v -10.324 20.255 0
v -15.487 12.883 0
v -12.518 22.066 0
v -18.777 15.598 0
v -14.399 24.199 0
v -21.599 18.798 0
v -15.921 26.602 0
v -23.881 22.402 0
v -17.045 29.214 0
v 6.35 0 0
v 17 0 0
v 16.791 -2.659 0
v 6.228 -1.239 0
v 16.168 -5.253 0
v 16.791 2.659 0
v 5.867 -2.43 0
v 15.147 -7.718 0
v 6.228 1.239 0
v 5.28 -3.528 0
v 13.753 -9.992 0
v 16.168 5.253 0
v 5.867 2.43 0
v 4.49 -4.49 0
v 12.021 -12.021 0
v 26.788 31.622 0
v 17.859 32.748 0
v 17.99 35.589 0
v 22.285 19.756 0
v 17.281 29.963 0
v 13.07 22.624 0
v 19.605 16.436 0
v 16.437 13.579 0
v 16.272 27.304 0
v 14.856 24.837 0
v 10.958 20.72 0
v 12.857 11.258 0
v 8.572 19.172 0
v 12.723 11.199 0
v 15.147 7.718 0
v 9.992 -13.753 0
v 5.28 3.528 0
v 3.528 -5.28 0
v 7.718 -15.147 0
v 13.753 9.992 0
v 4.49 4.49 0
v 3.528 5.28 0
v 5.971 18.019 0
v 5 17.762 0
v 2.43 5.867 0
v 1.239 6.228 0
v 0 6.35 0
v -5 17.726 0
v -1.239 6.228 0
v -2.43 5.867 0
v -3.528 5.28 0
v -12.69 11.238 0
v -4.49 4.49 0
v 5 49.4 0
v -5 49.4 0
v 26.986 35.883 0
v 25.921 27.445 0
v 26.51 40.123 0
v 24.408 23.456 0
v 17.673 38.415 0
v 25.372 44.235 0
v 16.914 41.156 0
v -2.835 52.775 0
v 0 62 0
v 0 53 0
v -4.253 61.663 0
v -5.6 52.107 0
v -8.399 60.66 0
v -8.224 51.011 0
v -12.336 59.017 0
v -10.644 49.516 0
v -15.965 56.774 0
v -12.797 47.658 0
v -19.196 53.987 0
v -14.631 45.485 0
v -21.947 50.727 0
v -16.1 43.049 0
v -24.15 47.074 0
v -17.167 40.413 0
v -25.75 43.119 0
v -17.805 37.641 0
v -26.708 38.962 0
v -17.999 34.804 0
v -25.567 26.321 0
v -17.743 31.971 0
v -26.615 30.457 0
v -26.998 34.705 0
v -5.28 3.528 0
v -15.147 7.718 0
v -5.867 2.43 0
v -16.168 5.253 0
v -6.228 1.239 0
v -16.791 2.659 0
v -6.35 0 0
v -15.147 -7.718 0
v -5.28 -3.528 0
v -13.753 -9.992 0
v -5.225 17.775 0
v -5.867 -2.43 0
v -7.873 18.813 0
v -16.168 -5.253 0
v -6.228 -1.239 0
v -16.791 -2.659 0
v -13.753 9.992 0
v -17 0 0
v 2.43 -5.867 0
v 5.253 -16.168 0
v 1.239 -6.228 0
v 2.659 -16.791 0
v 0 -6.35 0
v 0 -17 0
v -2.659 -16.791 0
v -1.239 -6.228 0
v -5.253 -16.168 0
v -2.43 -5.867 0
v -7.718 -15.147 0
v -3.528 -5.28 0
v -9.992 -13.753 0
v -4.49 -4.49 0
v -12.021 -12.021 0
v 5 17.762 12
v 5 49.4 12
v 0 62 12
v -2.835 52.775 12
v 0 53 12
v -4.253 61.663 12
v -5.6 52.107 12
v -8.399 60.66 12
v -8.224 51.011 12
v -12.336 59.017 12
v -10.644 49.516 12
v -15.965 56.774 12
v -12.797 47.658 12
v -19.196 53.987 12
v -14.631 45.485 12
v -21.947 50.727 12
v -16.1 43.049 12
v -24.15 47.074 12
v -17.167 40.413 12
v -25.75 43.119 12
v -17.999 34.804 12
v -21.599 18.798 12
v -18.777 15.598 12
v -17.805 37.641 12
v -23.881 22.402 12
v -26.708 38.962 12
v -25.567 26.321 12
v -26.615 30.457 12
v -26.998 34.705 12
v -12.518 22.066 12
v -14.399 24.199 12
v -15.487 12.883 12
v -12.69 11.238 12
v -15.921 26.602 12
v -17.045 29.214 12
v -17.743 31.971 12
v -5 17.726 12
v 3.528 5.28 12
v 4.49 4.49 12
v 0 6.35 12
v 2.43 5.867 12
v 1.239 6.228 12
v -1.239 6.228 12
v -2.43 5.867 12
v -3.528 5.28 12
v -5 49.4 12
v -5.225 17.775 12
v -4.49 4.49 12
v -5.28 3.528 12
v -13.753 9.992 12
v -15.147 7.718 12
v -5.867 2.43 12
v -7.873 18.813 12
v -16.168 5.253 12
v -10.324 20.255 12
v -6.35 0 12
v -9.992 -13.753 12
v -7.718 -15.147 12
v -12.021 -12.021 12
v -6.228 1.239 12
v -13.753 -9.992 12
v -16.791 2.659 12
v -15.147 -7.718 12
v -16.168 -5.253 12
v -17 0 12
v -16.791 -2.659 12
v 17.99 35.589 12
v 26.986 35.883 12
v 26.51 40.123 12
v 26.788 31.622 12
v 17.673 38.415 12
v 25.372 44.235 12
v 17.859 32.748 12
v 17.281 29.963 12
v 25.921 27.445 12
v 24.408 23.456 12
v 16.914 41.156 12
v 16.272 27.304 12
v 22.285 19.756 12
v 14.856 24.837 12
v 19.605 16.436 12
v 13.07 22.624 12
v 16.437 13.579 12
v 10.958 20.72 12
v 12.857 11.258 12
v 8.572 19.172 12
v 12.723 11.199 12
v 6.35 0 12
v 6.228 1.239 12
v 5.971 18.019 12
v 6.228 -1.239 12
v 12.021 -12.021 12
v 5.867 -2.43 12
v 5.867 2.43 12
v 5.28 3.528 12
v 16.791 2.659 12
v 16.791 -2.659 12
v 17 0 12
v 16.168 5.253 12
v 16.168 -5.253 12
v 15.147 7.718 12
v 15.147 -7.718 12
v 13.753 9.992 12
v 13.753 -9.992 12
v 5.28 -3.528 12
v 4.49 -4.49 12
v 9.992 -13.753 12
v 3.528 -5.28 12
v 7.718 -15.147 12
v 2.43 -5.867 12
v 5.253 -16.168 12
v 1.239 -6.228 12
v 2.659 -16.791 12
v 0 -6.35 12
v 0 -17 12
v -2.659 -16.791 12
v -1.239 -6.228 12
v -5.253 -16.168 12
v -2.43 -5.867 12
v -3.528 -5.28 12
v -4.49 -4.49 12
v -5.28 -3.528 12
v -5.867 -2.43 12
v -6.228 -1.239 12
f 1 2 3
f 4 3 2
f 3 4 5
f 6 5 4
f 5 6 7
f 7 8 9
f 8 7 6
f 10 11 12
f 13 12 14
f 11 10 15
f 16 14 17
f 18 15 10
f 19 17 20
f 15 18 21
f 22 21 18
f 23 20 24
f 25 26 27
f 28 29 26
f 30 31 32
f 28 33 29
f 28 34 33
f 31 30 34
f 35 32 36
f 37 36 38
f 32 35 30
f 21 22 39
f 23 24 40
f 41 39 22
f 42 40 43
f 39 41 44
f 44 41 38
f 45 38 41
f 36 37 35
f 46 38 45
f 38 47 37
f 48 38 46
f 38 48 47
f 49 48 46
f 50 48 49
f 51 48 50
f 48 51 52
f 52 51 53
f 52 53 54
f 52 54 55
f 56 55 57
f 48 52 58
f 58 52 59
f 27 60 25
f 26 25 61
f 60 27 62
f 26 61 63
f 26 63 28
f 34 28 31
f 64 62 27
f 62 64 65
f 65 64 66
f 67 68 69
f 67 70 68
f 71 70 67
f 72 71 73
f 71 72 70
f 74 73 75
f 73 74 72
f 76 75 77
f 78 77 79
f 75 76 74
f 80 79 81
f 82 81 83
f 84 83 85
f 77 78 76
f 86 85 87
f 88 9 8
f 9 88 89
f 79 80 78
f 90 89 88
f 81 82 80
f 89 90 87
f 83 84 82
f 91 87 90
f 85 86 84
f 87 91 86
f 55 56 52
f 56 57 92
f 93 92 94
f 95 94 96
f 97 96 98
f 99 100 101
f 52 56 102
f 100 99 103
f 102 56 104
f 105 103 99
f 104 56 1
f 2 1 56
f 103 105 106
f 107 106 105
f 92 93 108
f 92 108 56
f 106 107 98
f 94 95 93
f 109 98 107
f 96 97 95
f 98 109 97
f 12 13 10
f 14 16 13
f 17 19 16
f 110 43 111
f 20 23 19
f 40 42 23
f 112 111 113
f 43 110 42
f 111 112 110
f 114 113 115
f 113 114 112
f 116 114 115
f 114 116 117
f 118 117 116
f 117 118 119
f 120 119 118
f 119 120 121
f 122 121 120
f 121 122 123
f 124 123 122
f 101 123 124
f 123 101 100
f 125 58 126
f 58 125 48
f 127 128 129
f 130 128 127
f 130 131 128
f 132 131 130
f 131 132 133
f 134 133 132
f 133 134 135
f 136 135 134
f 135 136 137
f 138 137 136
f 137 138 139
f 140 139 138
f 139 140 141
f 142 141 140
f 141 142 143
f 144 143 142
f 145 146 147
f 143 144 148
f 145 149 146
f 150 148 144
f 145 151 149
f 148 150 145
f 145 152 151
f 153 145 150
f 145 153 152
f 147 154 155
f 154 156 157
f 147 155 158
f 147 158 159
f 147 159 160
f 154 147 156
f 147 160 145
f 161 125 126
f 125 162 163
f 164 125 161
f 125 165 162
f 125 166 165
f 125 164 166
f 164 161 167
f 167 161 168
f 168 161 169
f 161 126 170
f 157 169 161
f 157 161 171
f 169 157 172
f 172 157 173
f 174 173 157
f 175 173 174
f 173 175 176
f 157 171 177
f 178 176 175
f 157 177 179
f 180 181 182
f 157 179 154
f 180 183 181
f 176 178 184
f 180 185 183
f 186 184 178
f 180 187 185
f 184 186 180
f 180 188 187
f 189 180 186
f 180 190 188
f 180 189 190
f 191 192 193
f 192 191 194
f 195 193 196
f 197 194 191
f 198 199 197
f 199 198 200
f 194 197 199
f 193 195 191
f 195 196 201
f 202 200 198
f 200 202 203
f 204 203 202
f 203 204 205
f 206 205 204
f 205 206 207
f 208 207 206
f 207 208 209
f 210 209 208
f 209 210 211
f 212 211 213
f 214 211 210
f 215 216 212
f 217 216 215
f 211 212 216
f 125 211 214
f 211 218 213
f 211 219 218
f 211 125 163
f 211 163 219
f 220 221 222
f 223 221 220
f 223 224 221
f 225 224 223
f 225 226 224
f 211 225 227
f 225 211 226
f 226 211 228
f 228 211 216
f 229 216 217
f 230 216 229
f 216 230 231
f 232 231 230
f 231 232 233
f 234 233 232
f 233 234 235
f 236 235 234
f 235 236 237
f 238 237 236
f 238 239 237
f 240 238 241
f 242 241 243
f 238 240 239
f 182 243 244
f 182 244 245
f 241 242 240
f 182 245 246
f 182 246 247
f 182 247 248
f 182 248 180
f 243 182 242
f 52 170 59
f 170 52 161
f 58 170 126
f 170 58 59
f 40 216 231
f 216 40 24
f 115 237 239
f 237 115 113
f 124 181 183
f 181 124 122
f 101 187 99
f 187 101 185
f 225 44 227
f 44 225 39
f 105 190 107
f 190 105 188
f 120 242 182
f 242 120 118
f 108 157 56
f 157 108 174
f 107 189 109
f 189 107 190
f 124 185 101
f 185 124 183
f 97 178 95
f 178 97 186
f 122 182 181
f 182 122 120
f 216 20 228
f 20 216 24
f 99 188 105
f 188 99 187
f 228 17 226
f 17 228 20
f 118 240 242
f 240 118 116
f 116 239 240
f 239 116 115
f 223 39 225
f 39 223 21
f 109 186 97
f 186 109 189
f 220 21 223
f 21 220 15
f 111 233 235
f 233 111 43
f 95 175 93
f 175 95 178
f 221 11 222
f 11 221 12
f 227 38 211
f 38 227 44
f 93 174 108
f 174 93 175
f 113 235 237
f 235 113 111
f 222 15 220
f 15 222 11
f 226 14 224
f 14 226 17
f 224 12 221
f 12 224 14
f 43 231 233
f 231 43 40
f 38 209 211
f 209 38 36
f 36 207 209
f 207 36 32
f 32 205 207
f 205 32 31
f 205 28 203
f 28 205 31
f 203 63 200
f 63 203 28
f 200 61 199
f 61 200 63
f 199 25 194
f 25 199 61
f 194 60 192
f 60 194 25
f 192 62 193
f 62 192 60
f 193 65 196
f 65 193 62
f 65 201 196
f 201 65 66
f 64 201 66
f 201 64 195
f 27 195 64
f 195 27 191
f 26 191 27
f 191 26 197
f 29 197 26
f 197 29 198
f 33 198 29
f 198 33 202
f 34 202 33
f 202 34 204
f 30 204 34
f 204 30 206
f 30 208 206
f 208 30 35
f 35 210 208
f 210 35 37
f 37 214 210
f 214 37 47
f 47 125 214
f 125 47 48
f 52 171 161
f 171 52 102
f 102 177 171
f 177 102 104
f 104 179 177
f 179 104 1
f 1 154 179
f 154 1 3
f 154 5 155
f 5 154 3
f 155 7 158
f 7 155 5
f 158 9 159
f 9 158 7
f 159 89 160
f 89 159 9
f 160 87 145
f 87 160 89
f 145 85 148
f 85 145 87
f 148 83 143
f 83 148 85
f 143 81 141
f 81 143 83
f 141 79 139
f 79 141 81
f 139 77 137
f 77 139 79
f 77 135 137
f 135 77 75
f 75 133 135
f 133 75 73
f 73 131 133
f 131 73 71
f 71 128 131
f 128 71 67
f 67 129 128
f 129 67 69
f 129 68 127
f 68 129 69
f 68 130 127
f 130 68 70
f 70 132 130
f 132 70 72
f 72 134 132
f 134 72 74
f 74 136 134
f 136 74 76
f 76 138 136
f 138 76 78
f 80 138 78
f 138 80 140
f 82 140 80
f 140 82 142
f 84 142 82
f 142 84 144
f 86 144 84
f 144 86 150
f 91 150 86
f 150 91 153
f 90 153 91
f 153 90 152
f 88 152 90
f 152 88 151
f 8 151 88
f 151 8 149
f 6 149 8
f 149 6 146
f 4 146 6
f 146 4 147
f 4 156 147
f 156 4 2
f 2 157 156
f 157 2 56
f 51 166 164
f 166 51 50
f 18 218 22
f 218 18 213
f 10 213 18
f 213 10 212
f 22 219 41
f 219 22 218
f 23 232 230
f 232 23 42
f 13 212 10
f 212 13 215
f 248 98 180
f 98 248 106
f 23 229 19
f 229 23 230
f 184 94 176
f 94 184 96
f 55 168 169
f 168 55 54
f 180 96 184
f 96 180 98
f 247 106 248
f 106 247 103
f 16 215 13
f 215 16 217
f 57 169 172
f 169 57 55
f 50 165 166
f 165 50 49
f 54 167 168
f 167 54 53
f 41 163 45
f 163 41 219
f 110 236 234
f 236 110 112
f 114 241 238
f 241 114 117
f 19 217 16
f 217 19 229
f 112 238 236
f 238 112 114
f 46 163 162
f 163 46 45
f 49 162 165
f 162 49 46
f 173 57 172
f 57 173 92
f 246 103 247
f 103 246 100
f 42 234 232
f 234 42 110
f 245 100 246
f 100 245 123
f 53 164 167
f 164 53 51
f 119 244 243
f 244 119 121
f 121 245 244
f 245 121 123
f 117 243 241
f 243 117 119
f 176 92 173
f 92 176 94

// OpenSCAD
$fn = 32;

// ----------------------------------------------------------------------
// Hook: 70 mm shank into a 18 mm curl, 12 mm thick
// ----------------------------------------------------------------------

// --- parameters (mm) ---
shank_len = 70;           // shank length from the boss centre
shank_w = 10;             // shank width
boss_d = 34;              // boss diameter
bore_d = 12.7;            // boss bore
curl_in = 18;             // curl inner radius
curl_out = 27;            // curl outer radius
curl_sweep = 290;         // curl sweep angle
hook_t = 12;              // hook thickness

shank_profile = [[-5, 49.4], [5, 49.4], [5, 15], [-5, 15]];
boss_profile = [[17, 0], [16.791, 2.659], [16.168, 5.253], [15.147, 7.718], [13.753, 9.992], [12.021, 12.021], [9.992, 13.753], [7.718, 15.147], [5.253, 16.168], [2.659, 16.791], [0, 17], [-2.659, 16.791], [-5.253, 16.168], [-7.718, 15.147], [-9.992, 13.753], [-12.021, 12.021], [-13.753, 9.992], [-15.147, 7.718], [-16.168, 5.253], [-16.791, 2.659], [-17, 0], [-16.791, -2.659], [-16.168, -5.253], [-15.147, -7.718], [-13.753, -9.992], [-12.021, -12.021], [-9.992, -13.753], [-7.718, -15.147], [-5.253, -16.168], [-2.659, -16.791], [0, -17], [2.659, -16.791], [5.253, -16.168], [7.718, -15.147], [9.992, -13.753], [12.021, -12.021], [13.753, -9.992], [15.147, -7.718], [16.168, -5.253], [16.791, -2.659]];
curl_profile = [[0, 62], [-4.253, 61.663], [-8.399, 60.66], [-12.336, 59.017], [-15.965, 56.774], [-19.196, 53.987], [-21.947, 50.727], [-24.15, 47.074], [-25.75, 43.119], [-26.708, 38.962], [-26.998, 34.705], [-26.615, 30.457], [-25.567, 26.321], [-23.881, 22.402], [-21.599, 18.798], [-18.777, 15.598], [-15.487, 12.883], [-11.81, 10.72], [-7.838, 9.163], [-3.67, 8.251], [0.589, 8.006], [4.833, 8.436], [8.957, 9.529], [12.857, 11.258], [16.437, 13.579], [19.605, 16.436], [22.285, 19.756], [24.408, 23.456], [25.921, 27.445], [26.788, 31.622], [26.986, 35.883], [26.51, 40.123], [25.372, 44.235], [16.914, 41.156], [17.673, 38.415], [17.99, 35.589], [17.859, 32.748], [17.281, 29.963], [16.272, 27.304], [14.856, 24.837], [13.07, 22.624], [10.958, 20.72], [8.572, 19.172], [5.971, 18.019], [3.222, 17.291], [0.393, 17.004], [-2.447, 17.167], [-5.225, 17.775], [-7.873, 18.813], [-10.324, 20.255], [-12.518, 22.066], [-14.399, 24.199], [-15.921, 26.602], [-17.045, 29.214], [-17.743, 31.971], [-17.999, 34.804], [-17.805, 37.641], [-17.167, 40.413], [-16.1, 43.049], [-14.631, 45.485], [-12.797, 47.658], [-10.644, 49.516], [-8.224, 51.011], [-5.6, 52.107], [-2.835, 52.775], [0, 53]];

difference() {
  union() {
    /* three overlapping outlines: shank, boss and the smooth curl */
    linear_extrude(height = hook_t) polygon(shank_profile);
    linear_extrude(height = hook_t) polygon(boss_profile);
    linear_extrude(height = hook_t) polygon(curl_profile);
  }
  translate([0, 0, -2.5]) cylinder(h = hook_t + 5, d = bore_d);
}
